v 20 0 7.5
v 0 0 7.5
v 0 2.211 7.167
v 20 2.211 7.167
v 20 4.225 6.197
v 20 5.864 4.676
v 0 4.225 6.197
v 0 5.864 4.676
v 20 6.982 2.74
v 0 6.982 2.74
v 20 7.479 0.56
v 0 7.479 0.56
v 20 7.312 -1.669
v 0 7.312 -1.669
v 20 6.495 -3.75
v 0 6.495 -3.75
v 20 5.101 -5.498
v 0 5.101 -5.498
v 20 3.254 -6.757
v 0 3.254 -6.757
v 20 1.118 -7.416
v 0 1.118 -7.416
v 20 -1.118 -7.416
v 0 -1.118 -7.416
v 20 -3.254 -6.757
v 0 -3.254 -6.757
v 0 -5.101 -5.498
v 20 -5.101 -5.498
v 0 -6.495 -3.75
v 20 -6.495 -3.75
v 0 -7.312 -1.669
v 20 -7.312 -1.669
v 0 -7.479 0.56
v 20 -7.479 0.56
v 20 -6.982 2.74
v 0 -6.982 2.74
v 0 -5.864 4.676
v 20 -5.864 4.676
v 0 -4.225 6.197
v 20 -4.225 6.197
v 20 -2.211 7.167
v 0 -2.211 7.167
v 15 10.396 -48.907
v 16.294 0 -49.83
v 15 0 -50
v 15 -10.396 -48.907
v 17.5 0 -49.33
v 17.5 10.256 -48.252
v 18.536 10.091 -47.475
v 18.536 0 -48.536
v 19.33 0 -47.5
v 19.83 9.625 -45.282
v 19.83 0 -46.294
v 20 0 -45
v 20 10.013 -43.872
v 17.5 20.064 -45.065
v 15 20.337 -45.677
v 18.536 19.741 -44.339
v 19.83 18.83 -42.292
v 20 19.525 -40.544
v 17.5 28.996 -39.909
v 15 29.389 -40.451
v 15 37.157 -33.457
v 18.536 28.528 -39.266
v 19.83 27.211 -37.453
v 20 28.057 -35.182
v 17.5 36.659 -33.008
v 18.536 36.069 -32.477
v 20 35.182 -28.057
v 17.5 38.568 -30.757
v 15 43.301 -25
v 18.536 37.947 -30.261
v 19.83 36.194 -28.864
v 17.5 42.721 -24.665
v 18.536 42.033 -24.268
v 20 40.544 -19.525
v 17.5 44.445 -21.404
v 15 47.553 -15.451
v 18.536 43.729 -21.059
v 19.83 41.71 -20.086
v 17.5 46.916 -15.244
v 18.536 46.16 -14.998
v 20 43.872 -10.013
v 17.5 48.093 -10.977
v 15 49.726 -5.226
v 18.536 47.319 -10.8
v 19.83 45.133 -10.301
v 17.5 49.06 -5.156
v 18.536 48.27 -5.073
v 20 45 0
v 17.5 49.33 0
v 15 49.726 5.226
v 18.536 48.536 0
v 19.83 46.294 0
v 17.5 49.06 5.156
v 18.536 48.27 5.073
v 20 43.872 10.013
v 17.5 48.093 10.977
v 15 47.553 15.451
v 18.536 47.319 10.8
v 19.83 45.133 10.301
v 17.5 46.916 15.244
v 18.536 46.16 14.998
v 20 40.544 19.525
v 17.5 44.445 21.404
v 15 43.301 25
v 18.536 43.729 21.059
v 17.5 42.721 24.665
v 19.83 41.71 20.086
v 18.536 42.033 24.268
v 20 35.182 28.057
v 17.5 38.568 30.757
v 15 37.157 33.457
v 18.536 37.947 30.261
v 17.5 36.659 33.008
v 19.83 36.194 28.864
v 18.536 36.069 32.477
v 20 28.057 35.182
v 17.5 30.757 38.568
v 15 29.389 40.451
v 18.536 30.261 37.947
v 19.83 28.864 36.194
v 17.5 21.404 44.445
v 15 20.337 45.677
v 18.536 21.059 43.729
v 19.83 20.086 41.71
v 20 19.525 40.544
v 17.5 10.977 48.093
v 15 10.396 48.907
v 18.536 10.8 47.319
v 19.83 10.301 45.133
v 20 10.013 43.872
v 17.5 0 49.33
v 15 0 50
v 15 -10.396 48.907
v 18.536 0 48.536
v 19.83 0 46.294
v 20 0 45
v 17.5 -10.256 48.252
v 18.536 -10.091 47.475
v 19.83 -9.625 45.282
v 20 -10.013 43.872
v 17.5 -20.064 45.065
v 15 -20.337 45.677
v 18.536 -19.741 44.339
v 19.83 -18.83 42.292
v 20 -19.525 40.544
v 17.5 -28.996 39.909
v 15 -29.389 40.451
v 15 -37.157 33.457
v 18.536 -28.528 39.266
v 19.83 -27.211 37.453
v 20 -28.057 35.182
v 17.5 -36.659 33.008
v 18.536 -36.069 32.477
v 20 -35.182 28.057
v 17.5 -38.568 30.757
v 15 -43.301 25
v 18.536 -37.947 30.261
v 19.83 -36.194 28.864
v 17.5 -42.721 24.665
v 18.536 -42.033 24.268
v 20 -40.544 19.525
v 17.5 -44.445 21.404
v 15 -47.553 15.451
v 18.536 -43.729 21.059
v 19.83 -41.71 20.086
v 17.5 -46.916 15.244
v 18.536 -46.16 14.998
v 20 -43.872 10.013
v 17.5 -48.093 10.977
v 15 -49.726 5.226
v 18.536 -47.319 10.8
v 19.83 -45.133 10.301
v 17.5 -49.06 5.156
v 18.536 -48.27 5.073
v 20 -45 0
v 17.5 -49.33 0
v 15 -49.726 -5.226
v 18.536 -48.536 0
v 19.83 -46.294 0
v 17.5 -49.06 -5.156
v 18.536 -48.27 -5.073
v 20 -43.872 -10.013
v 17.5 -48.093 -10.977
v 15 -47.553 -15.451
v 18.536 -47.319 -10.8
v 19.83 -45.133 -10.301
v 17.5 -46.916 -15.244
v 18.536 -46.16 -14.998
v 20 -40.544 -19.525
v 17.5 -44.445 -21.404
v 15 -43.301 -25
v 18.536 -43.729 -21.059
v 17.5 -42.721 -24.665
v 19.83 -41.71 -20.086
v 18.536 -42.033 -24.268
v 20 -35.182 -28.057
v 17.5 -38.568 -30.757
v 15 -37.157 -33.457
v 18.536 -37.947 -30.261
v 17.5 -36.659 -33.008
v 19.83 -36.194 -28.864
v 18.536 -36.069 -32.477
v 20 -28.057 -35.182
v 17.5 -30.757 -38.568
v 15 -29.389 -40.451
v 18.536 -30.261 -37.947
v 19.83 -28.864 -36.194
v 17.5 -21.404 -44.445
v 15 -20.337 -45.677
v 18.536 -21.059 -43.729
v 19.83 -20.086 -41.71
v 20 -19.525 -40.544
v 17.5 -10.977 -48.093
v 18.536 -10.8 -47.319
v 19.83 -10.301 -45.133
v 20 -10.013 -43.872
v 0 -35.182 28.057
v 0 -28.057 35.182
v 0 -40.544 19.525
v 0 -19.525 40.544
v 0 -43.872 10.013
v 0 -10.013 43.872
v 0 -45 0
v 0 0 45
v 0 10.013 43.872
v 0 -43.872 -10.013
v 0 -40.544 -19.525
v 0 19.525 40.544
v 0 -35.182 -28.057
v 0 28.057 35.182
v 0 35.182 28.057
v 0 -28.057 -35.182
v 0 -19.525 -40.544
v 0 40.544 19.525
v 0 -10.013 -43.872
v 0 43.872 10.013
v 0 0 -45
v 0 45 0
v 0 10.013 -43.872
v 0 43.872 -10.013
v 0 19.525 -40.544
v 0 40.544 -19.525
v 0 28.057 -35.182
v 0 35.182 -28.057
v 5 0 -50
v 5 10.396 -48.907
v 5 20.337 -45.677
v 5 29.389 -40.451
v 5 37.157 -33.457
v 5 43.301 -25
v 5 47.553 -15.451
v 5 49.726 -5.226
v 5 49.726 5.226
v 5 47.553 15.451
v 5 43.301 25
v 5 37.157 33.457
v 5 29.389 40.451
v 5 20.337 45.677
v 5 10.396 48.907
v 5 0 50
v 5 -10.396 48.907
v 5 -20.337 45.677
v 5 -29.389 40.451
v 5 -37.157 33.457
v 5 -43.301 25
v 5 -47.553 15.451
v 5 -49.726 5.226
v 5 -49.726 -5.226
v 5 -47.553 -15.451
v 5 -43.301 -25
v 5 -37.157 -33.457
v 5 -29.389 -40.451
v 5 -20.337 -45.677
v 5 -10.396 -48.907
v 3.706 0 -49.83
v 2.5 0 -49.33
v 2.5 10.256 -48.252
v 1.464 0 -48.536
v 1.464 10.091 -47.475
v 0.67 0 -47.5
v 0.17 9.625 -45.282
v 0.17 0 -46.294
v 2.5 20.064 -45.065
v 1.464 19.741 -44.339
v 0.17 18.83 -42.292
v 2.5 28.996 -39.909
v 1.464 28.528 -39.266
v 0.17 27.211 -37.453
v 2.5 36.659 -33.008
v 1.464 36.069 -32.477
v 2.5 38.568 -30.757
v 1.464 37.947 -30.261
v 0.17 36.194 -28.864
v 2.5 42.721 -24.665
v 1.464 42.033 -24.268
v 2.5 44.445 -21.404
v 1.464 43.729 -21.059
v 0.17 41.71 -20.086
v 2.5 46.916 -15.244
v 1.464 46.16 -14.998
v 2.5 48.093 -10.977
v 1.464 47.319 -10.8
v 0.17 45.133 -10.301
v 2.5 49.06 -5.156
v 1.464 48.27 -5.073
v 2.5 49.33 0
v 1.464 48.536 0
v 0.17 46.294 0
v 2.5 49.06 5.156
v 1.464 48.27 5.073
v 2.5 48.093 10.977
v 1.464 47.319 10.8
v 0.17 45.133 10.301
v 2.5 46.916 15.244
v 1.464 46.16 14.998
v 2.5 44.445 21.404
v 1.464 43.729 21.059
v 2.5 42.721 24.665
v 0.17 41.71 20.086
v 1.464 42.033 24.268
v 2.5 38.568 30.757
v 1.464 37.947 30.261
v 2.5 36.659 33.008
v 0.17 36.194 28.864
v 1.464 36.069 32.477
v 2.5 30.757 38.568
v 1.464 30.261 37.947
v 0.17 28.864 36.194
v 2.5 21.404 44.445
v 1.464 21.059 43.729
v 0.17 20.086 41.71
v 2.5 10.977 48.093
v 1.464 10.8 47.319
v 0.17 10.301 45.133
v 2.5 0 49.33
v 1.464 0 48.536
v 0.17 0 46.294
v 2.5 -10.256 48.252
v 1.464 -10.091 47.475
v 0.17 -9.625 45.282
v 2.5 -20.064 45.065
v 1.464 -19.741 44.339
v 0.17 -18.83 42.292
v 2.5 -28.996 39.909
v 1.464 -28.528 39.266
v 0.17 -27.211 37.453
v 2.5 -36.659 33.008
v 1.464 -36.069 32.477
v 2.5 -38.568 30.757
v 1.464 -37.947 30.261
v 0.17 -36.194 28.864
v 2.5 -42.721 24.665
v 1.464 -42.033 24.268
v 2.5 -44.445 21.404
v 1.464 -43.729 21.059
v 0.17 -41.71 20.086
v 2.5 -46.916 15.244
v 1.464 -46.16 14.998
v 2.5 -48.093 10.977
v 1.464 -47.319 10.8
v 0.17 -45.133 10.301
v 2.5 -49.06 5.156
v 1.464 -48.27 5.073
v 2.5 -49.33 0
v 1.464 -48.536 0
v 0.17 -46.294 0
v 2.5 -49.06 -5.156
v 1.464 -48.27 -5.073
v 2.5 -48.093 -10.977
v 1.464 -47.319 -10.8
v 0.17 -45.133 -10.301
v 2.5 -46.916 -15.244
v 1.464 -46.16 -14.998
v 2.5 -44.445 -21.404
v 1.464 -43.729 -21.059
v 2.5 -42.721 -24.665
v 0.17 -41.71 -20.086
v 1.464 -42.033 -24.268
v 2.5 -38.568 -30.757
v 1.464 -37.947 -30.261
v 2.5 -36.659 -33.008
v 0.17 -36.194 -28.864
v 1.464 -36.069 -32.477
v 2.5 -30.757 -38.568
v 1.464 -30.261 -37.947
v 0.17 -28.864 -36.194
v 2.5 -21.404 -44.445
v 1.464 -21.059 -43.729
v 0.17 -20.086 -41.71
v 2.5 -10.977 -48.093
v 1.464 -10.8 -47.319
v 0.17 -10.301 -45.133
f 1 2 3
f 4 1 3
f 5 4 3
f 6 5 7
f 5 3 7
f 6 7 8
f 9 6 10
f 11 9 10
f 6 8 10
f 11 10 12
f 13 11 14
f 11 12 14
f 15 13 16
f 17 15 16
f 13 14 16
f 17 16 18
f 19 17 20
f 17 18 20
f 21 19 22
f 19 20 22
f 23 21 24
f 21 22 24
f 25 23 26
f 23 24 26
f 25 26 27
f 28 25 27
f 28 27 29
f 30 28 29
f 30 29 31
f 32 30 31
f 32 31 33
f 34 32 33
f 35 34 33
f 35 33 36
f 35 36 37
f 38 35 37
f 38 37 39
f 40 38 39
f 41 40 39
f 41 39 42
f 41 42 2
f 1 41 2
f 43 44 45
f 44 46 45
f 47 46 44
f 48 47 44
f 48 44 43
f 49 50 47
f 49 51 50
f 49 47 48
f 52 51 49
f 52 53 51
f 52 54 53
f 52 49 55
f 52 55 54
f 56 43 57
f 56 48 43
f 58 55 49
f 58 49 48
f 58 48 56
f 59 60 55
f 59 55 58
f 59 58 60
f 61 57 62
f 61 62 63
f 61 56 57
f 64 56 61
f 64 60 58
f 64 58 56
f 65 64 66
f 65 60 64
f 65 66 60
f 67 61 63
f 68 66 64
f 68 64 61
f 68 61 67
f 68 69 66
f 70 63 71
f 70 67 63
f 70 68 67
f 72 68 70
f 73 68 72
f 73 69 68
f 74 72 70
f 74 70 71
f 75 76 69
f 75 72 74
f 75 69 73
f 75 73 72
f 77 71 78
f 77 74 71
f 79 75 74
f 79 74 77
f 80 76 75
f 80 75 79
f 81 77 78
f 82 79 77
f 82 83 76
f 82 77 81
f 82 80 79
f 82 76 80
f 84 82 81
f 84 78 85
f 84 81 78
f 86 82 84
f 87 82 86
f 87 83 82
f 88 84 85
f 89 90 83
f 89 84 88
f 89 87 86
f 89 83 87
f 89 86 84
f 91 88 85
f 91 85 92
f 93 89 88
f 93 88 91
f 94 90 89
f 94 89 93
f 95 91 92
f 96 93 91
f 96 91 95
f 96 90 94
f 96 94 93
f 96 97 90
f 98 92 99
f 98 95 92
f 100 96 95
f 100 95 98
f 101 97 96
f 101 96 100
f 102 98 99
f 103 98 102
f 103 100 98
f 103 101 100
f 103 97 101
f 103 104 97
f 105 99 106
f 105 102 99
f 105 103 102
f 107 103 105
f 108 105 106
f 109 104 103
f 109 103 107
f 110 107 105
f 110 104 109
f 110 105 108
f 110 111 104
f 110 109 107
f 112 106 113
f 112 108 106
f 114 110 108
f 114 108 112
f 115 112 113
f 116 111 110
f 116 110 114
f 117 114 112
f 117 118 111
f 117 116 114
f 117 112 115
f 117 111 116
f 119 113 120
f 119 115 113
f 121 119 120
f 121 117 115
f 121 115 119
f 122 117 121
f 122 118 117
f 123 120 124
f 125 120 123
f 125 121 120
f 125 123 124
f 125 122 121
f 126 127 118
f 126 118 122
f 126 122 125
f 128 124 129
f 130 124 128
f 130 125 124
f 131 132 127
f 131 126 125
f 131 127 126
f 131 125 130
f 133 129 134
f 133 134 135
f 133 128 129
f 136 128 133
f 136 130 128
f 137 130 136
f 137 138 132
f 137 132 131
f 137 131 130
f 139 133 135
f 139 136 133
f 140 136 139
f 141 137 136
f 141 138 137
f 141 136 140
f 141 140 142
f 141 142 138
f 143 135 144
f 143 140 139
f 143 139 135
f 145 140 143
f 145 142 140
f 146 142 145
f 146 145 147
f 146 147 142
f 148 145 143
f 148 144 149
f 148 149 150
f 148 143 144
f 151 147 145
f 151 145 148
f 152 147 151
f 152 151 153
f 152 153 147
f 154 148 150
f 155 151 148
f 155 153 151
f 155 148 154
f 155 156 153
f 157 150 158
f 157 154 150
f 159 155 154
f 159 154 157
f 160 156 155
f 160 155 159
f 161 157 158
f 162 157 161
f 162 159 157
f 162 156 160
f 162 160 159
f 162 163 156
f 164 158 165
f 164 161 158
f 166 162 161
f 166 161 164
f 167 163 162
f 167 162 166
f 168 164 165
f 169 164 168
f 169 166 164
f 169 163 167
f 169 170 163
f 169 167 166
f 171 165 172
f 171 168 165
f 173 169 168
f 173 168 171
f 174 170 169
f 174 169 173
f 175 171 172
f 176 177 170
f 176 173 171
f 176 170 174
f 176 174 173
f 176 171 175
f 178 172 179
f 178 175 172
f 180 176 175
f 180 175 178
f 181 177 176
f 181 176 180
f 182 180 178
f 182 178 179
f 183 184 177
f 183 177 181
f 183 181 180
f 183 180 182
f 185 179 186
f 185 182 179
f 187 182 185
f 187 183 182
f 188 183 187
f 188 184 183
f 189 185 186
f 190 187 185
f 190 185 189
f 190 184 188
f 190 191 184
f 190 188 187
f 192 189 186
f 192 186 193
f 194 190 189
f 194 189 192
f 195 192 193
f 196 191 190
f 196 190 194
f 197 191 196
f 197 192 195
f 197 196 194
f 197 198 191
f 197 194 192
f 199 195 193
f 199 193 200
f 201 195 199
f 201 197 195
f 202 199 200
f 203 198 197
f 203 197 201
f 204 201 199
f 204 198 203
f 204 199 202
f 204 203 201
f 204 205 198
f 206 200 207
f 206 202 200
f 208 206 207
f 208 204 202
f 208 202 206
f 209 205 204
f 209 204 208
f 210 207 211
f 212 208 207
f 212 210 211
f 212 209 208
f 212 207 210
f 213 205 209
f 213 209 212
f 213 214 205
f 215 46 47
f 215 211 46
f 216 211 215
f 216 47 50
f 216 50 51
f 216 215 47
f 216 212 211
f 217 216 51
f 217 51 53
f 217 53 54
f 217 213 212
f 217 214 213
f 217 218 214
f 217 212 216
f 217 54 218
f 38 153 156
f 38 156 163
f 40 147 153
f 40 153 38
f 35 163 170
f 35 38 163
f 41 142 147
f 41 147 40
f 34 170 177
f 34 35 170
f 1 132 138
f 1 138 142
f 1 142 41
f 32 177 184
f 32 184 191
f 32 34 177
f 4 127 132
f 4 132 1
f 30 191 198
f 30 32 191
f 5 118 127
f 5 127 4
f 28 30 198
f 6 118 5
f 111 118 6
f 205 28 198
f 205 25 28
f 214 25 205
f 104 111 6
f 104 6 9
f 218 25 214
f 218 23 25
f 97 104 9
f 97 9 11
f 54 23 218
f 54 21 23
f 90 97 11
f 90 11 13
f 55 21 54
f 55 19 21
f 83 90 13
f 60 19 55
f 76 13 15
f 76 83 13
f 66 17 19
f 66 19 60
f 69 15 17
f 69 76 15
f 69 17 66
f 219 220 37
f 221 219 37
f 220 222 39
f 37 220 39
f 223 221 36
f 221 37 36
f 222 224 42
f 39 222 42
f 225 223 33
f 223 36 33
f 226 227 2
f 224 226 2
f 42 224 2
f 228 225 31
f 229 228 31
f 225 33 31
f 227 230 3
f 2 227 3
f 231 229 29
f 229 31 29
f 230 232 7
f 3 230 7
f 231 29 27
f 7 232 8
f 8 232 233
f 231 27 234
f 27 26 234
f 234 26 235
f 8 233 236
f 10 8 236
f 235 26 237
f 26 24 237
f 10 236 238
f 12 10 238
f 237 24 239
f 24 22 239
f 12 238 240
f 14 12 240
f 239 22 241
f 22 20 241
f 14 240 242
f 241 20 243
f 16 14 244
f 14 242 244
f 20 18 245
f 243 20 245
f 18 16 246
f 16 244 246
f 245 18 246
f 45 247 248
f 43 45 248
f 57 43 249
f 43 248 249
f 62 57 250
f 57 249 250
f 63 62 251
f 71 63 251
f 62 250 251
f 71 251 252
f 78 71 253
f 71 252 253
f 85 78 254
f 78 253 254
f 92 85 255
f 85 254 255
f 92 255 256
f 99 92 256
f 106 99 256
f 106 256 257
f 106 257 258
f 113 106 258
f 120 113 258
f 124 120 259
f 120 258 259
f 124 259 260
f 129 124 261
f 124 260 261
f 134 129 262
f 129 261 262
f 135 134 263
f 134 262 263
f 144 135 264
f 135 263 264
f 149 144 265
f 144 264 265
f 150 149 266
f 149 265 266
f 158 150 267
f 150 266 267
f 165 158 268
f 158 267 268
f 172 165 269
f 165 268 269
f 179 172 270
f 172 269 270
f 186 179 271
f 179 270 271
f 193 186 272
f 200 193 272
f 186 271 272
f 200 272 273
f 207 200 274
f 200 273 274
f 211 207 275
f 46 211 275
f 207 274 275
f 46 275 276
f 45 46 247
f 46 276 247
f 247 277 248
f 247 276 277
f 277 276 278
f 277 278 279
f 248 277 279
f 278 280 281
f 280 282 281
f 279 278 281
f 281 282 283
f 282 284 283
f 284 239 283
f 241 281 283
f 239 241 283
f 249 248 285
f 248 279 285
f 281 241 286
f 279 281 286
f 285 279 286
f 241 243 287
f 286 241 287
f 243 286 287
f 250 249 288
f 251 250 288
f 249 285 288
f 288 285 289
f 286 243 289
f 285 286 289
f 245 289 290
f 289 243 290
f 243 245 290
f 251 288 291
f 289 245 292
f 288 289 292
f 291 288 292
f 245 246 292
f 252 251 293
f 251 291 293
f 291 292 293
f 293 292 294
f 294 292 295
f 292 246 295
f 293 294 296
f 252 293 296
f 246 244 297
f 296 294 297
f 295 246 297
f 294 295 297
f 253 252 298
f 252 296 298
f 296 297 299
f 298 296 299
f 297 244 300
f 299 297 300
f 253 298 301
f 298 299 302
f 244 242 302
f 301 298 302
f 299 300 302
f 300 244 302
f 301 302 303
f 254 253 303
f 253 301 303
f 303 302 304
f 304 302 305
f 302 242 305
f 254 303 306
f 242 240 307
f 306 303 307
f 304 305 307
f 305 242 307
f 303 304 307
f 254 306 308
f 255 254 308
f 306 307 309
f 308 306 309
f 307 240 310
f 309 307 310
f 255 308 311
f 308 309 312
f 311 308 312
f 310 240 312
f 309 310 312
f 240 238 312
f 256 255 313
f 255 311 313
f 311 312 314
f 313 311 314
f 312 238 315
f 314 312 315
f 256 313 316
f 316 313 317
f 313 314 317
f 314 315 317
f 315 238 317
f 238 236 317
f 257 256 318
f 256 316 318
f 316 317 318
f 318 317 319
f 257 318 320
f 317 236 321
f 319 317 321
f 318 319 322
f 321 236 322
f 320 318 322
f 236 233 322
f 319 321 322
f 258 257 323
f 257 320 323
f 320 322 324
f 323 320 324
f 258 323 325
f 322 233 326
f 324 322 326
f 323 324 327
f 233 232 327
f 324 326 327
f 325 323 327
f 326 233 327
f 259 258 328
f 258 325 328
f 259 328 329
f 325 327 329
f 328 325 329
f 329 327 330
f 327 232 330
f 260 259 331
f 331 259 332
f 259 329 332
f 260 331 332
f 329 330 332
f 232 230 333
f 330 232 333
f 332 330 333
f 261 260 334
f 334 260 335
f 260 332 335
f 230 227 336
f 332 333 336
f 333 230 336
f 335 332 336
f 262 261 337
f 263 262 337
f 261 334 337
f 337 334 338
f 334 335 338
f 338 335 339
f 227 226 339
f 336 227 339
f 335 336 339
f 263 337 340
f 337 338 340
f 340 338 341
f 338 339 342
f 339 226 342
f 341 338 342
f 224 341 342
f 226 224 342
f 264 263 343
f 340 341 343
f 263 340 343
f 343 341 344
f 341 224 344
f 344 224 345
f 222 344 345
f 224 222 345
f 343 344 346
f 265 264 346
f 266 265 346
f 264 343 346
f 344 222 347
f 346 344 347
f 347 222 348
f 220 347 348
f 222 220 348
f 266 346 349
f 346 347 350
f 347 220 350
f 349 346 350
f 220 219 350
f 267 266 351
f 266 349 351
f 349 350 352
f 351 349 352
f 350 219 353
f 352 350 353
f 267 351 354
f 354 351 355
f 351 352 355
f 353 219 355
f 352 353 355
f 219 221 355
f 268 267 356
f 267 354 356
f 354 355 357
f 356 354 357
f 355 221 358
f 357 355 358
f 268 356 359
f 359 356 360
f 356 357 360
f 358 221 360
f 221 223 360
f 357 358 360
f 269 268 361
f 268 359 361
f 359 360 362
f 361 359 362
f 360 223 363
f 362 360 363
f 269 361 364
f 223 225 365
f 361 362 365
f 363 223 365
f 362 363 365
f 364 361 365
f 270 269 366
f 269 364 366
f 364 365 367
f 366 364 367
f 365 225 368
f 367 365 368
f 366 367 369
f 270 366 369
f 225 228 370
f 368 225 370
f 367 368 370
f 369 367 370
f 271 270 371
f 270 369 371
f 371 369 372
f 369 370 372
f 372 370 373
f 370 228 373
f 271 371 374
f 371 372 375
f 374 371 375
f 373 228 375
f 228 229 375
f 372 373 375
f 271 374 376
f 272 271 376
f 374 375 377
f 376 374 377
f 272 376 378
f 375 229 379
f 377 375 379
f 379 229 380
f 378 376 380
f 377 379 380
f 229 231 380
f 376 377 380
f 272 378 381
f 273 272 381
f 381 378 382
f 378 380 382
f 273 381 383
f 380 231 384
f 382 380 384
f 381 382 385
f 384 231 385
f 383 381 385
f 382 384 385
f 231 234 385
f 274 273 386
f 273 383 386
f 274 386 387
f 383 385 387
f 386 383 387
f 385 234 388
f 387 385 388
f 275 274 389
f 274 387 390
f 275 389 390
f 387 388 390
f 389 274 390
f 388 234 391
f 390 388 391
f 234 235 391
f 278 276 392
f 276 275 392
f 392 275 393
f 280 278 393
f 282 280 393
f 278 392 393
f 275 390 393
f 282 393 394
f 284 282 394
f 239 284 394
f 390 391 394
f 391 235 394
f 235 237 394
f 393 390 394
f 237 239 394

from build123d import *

# Parameters (mm, degrees)
SKETCH_1_R          = 50
EXTRUDE_1_DEPTH     = 20
FILLET_1_R          = 5
SKETCH_2_R          = 7.5
CUT_EXTRUDE_1_DEPTH = 30


with BuildPart() as part:
    # 草图1 → 凸台-拉伸1 (new body)
    with BuildSketch(Plane(origin=(0, 0, 0), x_dir=(0, 0, -1), z_dir=(1, 0, 0))):
        Circle(SKETCH_1_R)
    extrude(amount=EXTRUDE_1_DEPTH)

    # 圆角1
    fillet_1_edges = [part.edges().sort_by_distance(p)[0] for p in [
        (0, 0, 50),
        (20, 0, 50),
    ]]
    fillet(fillet_1_edges, radius=FILLET_1_R)

    # 草图2 → 切除-拉伸1 (cut)
    with BuildSketch(Plane.ZY):
        Circle(SKETCH_2_R)
    extrude(amount=-CUT_EXTRUDE_1_DEPTH, mode=Mode.SUBTRACT)


solid = part.part
